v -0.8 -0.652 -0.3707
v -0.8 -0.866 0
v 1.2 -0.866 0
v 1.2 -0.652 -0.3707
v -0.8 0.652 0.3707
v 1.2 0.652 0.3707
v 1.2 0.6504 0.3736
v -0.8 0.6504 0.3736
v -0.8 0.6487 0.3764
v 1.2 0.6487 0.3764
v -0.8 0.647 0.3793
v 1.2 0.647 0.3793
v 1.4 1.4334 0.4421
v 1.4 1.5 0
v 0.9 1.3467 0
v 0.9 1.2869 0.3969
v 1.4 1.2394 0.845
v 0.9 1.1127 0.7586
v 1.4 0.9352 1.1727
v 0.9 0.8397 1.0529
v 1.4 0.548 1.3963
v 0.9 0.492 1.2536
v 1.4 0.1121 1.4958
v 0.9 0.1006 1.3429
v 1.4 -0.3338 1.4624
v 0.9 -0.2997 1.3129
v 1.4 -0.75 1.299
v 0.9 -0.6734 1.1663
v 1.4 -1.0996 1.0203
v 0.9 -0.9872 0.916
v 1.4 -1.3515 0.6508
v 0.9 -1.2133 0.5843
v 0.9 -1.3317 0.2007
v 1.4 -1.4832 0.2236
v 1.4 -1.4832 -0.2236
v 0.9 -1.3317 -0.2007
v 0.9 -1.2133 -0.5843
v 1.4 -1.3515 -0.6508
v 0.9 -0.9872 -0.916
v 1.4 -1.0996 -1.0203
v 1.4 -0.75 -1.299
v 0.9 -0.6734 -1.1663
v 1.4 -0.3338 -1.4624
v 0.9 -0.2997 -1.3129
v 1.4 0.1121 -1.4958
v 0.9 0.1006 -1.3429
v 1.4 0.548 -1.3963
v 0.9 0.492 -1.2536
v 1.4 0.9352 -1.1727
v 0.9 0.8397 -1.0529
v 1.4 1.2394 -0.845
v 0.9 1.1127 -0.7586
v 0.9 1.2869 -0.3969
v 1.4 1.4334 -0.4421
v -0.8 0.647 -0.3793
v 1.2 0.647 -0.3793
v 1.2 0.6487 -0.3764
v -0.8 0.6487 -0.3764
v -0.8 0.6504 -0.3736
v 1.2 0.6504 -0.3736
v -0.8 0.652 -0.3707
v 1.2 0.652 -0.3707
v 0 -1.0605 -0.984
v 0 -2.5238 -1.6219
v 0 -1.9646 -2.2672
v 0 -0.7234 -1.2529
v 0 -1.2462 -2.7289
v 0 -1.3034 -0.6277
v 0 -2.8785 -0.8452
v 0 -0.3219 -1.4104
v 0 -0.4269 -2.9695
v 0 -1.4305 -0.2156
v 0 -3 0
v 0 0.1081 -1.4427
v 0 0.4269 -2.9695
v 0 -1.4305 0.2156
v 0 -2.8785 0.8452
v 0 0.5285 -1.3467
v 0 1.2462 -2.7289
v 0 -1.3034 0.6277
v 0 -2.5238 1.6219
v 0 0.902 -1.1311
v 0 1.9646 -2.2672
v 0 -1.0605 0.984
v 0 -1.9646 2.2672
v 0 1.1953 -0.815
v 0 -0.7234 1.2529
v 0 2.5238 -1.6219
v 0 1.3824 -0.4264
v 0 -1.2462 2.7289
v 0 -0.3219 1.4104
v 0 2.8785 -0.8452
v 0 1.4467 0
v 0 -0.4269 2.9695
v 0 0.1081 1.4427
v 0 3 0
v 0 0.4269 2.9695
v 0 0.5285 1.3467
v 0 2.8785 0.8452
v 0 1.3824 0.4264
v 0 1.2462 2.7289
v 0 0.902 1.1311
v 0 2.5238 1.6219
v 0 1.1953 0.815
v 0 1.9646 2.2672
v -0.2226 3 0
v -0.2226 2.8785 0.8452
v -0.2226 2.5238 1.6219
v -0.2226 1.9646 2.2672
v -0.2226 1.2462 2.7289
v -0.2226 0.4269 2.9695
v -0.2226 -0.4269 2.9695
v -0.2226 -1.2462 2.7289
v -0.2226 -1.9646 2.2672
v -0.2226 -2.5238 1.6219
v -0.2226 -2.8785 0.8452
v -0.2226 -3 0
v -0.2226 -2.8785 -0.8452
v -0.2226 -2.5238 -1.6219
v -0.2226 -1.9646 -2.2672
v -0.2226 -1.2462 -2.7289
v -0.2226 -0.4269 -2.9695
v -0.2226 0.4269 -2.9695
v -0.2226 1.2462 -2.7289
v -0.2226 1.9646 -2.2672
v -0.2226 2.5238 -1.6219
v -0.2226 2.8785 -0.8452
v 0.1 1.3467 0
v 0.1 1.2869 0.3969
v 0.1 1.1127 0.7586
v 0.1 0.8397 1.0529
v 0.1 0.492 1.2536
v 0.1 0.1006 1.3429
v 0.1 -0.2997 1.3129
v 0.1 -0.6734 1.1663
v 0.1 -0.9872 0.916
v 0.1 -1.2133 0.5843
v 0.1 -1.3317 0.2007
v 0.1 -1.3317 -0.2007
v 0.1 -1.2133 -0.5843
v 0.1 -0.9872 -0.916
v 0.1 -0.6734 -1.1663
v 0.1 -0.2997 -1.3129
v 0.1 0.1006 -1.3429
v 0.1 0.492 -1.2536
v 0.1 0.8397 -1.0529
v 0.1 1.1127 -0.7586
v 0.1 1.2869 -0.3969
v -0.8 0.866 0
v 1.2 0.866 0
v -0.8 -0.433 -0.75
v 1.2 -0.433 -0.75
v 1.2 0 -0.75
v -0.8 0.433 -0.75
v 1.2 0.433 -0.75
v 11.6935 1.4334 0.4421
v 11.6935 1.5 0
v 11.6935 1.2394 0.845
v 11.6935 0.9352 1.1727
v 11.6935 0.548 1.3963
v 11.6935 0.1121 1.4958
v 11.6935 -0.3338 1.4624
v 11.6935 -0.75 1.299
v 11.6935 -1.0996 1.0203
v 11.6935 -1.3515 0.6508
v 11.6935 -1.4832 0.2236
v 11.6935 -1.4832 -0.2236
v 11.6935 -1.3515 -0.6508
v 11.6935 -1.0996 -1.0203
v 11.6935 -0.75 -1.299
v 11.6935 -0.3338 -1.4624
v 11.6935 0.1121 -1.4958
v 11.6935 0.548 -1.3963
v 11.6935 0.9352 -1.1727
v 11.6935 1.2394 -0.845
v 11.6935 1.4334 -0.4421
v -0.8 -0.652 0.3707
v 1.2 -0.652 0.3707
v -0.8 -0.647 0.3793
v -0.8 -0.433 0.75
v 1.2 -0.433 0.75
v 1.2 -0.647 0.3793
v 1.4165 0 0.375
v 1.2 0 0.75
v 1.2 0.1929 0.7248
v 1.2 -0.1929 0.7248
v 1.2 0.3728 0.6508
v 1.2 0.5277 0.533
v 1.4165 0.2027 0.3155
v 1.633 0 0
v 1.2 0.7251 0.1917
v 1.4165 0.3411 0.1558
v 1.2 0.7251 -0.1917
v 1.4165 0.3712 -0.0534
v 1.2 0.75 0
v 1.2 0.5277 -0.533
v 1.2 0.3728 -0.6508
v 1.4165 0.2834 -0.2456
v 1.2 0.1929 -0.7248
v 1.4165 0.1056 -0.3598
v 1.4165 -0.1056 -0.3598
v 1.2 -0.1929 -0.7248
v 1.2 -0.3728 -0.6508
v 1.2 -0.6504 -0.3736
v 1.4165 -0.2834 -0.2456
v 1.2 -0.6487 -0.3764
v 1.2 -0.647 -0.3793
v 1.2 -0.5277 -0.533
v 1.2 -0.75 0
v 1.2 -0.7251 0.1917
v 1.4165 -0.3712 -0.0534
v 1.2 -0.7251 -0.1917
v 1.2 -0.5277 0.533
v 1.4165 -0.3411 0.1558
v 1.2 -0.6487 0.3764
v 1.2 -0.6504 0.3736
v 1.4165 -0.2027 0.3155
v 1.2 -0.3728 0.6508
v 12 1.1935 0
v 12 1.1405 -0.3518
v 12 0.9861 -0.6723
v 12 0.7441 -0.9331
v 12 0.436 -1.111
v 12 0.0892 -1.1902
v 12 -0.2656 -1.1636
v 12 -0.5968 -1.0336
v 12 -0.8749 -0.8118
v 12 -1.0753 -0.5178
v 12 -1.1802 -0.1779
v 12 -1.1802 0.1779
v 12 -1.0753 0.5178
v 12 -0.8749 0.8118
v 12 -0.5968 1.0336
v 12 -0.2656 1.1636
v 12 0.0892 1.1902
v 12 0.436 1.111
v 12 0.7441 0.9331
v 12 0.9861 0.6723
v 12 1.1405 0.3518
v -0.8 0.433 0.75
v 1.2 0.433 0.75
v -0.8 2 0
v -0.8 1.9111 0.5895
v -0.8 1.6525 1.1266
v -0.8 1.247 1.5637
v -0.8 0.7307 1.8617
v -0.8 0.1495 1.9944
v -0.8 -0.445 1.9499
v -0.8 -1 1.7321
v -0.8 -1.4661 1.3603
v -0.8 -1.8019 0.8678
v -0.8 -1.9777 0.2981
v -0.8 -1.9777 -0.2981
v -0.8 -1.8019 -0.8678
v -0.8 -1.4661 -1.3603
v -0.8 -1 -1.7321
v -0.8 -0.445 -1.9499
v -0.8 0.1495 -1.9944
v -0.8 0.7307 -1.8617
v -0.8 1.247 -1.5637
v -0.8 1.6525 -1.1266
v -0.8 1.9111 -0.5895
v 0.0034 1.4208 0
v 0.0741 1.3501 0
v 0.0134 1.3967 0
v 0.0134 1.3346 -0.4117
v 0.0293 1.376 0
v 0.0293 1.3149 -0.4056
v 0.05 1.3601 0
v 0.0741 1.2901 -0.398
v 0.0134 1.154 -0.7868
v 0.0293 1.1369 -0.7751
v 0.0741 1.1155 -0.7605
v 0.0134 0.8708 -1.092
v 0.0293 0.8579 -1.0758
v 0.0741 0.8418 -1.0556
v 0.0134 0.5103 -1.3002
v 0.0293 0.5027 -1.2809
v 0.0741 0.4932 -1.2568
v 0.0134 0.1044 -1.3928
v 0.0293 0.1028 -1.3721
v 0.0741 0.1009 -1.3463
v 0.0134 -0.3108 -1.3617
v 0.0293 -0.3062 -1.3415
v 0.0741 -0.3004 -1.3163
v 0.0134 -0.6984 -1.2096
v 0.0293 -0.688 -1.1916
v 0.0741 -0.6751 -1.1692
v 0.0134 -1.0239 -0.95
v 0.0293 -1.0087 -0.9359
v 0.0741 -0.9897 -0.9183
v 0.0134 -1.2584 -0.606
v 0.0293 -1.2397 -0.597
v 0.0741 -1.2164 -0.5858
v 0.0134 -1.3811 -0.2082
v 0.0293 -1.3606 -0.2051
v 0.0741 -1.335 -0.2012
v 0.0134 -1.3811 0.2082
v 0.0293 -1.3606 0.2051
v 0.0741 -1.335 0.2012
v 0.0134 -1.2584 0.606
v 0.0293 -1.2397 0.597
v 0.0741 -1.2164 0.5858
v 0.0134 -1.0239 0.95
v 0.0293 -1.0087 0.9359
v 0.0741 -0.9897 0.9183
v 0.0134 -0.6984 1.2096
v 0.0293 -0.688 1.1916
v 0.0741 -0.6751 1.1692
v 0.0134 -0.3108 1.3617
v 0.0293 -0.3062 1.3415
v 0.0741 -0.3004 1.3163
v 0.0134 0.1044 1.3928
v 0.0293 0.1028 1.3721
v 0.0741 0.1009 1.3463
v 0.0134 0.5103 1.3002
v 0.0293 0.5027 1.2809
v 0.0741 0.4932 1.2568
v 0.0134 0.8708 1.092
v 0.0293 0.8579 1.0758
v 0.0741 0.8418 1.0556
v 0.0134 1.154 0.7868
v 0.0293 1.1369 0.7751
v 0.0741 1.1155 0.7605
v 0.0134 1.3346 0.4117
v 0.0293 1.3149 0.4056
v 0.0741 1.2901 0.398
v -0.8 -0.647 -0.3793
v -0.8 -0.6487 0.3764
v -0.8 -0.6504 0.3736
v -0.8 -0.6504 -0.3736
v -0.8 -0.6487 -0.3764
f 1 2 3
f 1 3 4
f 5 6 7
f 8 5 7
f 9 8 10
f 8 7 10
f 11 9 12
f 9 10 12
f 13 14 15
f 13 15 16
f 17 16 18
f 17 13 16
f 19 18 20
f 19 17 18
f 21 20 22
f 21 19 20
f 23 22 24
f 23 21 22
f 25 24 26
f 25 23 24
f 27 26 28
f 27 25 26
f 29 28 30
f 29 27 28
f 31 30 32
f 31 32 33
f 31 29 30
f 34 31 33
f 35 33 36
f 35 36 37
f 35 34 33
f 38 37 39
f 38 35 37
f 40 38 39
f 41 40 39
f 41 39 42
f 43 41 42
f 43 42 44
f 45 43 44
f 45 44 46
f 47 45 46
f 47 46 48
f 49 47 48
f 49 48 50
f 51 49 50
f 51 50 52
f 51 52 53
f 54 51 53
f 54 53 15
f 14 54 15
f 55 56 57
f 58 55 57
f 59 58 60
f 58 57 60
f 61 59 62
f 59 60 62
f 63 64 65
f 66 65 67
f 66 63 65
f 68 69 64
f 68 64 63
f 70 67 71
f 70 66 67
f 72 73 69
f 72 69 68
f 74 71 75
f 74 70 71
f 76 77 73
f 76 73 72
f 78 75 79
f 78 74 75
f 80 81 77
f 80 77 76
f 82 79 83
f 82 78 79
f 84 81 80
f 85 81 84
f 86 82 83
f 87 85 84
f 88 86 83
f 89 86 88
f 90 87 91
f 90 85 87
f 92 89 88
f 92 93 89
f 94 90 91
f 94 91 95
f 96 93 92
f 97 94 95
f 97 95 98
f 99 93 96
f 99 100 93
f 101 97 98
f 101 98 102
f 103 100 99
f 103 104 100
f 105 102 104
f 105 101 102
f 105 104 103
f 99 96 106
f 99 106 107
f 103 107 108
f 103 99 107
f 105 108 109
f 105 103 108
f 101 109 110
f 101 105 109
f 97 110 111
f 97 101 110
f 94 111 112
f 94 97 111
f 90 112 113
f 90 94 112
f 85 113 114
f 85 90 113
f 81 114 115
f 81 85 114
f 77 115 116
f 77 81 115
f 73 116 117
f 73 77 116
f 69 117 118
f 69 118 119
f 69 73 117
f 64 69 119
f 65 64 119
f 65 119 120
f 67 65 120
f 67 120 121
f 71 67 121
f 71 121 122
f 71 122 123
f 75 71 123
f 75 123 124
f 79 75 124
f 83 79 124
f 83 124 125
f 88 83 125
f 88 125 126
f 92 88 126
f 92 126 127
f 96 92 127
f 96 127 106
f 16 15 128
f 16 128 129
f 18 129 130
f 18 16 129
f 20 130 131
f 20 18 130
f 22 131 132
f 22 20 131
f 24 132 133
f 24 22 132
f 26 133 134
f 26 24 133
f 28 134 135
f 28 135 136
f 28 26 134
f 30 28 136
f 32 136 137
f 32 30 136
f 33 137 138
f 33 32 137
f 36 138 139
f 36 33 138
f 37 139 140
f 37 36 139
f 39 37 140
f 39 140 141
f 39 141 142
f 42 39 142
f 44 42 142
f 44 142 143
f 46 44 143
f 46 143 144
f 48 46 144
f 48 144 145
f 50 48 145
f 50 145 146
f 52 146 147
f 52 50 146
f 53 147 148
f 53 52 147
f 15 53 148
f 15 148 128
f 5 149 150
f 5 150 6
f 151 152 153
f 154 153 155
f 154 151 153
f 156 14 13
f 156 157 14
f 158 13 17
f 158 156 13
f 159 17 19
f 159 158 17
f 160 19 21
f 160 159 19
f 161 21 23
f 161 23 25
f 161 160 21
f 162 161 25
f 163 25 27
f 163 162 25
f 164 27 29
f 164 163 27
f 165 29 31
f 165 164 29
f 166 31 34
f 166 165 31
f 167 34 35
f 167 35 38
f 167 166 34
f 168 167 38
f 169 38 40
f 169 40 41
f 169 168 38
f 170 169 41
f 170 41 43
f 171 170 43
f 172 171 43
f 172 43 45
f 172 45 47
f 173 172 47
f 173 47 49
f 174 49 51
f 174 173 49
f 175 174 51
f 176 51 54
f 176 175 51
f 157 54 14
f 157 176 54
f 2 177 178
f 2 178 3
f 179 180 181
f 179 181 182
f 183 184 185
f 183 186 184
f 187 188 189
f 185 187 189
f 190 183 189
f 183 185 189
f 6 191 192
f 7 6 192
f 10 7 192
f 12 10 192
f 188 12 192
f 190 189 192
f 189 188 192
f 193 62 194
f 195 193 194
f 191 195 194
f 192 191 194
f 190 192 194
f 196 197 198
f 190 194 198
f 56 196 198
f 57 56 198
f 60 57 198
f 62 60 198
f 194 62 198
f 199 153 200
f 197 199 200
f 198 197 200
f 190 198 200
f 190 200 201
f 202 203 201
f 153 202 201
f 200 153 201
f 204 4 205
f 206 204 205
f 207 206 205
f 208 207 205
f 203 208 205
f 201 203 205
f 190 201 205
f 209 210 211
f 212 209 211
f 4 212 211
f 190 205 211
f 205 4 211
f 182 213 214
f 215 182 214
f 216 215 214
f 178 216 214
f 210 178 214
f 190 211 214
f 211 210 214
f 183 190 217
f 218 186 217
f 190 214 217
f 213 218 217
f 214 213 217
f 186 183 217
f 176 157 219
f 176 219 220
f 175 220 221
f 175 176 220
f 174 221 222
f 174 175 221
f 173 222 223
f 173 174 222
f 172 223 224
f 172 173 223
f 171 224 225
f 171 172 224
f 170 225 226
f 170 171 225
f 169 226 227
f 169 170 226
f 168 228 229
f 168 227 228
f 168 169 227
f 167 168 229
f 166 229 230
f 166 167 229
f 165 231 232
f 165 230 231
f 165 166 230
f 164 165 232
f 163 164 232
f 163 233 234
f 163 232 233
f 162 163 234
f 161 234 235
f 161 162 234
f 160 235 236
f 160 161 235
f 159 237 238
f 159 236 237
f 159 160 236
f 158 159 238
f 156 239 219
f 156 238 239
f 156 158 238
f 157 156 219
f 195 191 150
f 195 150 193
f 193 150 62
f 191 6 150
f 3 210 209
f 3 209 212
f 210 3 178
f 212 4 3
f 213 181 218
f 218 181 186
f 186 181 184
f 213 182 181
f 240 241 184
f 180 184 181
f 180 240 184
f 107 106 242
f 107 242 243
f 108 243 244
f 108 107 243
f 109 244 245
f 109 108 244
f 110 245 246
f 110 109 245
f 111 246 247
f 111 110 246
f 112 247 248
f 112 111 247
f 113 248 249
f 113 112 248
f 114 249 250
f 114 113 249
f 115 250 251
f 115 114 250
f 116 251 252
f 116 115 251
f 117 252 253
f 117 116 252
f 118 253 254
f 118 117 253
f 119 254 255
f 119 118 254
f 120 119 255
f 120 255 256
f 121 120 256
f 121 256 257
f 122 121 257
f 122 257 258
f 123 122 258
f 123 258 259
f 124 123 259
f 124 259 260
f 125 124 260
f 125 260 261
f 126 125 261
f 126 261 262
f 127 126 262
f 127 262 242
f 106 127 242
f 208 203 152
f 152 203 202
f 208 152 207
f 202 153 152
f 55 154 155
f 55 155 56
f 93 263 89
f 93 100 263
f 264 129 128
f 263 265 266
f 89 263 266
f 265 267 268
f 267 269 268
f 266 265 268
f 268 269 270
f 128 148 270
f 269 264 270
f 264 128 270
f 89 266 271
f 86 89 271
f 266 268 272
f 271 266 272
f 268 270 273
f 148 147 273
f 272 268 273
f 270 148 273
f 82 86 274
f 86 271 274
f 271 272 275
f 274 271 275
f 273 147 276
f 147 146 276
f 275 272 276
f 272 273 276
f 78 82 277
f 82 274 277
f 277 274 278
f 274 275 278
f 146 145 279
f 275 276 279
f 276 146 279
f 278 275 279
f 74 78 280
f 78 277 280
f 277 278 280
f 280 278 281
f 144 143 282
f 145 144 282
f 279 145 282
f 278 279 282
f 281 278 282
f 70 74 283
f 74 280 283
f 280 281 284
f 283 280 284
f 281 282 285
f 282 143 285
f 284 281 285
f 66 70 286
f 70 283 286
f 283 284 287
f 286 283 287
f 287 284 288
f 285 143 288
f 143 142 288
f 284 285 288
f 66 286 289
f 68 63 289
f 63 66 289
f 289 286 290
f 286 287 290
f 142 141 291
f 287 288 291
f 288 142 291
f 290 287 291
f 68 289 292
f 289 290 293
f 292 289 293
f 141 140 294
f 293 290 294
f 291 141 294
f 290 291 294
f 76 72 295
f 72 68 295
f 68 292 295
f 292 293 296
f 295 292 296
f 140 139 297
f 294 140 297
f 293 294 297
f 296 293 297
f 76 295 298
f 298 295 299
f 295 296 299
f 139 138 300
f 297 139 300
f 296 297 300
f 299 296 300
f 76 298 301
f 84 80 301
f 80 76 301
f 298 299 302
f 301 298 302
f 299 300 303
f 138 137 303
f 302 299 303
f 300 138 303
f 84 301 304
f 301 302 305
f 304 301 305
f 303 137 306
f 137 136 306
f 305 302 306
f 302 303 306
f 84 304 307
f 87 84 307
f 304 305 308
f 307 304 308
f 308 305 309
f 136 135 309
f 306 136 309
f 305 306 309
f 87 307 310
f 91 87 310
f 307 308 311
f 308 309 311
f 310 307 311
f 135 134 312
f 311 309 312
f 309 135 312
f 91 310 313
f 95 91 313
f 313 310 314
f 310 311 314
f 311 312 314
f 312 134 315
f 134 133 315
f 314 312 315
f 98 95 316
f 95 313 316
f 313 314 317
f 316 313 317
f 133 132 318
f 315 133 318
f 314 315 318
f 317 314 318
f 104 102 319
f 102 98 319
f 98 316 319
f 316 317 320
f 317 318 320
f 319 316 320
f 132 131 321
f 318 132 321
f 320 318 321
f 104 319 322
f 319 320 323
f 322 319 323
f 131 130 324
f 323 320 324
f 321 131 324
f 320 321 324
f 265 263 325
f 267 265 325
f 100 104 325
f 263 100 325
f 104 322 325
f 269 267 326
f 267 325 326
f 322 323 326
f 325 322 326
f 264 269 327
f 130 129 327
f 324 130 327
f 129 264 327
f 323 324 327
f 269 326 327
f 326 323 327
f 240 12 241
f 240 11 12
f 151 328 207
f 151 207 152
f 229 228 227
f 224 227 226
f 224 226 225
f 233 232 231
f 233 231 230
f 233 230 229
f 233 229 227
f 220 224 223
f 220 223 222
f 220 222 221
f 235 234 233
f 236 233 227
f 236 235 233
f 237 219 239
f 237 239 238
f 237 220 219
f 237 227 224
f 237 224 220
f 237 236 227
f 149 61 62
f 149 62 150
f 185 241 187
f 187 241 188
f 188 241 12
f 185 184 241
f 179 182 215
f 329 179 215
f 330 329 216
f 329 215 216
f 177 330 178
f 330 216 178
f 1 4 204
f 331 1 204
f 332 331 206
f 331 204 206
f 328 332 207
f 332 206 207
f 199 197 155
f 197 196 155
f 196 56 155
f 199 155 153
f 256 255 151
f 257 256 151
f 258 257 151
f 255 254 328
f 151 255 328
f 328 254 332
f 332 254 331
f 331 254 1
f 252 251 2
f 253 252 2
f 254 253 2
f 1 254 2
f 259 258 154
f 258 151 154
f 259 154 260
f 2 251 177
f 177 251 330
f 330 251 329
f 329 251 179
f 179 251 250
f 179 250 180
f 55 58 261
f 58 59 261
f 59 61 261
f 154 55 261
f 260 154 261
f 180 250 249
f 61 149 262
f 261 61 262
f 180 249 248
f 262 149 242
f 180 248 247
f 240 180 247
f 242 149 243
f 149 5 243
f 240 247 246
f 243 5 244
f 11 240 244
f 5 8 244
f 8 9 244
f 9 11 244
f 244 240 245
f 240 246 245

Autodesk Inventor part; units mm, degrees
ref_plane "YZ Plane" through (0, 0, 0) normal (1, 0, 0) x (0, 1, 0)
ref_plane "XZ Plane" through (0, 0, 0) normal (0, 1, 0) x (-1, 0, 0)
ref_plane "XY Plane" through (0, 0, 0) normal (0, 0, 1) x (1, 0, 0)
sketch "Sketch_1" plane through (0, 0, 0) normal (0, 0, 1) x (1, 0, 0)
  line L0 (12, 0) -> (-0.8, 0)
  line L1 (-0.8, 0) -> (-0.8, 2)
  line L2 (-0.8, 2) -> (-0.2226, 3)
  line L3 (-0.2226, 3) -> (0, 3)
  line L4 (0, 3) -> (0, 1.4467)
  arc A0 (0, 1.4467) -> (0.1, 1.3467) centre (0.1, 1.4467) ccw
  line L5 (0.1, 1.3467) -> (0.9, 1.3467)
  line L6 (0.9, 1.3467) -> (1.4, 1.5)
  line L7 (1.4, 1.5) -> (11.6935, 1.5)
  line L8 (11.6935, 1.5) -> (12, 1.1935)
  line L9 (12, 1.1935) -> (12, 0)
  line L10 (12, 0) -> (-0.8, 0)
revolve "Revolution1" add sketch "Sketch_1" angle 360 about axis through (12, 0, 0) along (1, 0, 0)
thread "Thread1" size "M3x0.5" class "6g" standard "ISO Metric profile" full length
sketch "Sketch2" plane through (-0.8, 0, 0) normal (-1, 0, 0) x (0, 0, 1)
  point P0 (0, 0)
hole "Hole1" at (-0.8, 0, 0) direction (1, 0, 0) diameter 1.5 depth 2 tip angle 120
sketch "Sketch_3" plane through (-0.8, 0, 0) normal (1, 0, 0) x (0, 0, -1)
  line L0 (-0.75, -0.433) -> (0, -0.866)
  line L1 (0, -0.866) -> (0.75, -0.433)
  line L2 (0.75, -0.433) -> (0.75, 0.433)
  line L3 (0.75, 0.433) -> (0, 0.866)
  line L4 (0, 0.866) -> (-0.75, 0.433)
  line L5 (-0.75, 0.433) -> (-0.75, -0.433)
extrude "Extrusion1" cut sketch "Sketch_3" along normal blind 2
properties part number "CBSTNR3-12" material "鋼、炭素鋼"
